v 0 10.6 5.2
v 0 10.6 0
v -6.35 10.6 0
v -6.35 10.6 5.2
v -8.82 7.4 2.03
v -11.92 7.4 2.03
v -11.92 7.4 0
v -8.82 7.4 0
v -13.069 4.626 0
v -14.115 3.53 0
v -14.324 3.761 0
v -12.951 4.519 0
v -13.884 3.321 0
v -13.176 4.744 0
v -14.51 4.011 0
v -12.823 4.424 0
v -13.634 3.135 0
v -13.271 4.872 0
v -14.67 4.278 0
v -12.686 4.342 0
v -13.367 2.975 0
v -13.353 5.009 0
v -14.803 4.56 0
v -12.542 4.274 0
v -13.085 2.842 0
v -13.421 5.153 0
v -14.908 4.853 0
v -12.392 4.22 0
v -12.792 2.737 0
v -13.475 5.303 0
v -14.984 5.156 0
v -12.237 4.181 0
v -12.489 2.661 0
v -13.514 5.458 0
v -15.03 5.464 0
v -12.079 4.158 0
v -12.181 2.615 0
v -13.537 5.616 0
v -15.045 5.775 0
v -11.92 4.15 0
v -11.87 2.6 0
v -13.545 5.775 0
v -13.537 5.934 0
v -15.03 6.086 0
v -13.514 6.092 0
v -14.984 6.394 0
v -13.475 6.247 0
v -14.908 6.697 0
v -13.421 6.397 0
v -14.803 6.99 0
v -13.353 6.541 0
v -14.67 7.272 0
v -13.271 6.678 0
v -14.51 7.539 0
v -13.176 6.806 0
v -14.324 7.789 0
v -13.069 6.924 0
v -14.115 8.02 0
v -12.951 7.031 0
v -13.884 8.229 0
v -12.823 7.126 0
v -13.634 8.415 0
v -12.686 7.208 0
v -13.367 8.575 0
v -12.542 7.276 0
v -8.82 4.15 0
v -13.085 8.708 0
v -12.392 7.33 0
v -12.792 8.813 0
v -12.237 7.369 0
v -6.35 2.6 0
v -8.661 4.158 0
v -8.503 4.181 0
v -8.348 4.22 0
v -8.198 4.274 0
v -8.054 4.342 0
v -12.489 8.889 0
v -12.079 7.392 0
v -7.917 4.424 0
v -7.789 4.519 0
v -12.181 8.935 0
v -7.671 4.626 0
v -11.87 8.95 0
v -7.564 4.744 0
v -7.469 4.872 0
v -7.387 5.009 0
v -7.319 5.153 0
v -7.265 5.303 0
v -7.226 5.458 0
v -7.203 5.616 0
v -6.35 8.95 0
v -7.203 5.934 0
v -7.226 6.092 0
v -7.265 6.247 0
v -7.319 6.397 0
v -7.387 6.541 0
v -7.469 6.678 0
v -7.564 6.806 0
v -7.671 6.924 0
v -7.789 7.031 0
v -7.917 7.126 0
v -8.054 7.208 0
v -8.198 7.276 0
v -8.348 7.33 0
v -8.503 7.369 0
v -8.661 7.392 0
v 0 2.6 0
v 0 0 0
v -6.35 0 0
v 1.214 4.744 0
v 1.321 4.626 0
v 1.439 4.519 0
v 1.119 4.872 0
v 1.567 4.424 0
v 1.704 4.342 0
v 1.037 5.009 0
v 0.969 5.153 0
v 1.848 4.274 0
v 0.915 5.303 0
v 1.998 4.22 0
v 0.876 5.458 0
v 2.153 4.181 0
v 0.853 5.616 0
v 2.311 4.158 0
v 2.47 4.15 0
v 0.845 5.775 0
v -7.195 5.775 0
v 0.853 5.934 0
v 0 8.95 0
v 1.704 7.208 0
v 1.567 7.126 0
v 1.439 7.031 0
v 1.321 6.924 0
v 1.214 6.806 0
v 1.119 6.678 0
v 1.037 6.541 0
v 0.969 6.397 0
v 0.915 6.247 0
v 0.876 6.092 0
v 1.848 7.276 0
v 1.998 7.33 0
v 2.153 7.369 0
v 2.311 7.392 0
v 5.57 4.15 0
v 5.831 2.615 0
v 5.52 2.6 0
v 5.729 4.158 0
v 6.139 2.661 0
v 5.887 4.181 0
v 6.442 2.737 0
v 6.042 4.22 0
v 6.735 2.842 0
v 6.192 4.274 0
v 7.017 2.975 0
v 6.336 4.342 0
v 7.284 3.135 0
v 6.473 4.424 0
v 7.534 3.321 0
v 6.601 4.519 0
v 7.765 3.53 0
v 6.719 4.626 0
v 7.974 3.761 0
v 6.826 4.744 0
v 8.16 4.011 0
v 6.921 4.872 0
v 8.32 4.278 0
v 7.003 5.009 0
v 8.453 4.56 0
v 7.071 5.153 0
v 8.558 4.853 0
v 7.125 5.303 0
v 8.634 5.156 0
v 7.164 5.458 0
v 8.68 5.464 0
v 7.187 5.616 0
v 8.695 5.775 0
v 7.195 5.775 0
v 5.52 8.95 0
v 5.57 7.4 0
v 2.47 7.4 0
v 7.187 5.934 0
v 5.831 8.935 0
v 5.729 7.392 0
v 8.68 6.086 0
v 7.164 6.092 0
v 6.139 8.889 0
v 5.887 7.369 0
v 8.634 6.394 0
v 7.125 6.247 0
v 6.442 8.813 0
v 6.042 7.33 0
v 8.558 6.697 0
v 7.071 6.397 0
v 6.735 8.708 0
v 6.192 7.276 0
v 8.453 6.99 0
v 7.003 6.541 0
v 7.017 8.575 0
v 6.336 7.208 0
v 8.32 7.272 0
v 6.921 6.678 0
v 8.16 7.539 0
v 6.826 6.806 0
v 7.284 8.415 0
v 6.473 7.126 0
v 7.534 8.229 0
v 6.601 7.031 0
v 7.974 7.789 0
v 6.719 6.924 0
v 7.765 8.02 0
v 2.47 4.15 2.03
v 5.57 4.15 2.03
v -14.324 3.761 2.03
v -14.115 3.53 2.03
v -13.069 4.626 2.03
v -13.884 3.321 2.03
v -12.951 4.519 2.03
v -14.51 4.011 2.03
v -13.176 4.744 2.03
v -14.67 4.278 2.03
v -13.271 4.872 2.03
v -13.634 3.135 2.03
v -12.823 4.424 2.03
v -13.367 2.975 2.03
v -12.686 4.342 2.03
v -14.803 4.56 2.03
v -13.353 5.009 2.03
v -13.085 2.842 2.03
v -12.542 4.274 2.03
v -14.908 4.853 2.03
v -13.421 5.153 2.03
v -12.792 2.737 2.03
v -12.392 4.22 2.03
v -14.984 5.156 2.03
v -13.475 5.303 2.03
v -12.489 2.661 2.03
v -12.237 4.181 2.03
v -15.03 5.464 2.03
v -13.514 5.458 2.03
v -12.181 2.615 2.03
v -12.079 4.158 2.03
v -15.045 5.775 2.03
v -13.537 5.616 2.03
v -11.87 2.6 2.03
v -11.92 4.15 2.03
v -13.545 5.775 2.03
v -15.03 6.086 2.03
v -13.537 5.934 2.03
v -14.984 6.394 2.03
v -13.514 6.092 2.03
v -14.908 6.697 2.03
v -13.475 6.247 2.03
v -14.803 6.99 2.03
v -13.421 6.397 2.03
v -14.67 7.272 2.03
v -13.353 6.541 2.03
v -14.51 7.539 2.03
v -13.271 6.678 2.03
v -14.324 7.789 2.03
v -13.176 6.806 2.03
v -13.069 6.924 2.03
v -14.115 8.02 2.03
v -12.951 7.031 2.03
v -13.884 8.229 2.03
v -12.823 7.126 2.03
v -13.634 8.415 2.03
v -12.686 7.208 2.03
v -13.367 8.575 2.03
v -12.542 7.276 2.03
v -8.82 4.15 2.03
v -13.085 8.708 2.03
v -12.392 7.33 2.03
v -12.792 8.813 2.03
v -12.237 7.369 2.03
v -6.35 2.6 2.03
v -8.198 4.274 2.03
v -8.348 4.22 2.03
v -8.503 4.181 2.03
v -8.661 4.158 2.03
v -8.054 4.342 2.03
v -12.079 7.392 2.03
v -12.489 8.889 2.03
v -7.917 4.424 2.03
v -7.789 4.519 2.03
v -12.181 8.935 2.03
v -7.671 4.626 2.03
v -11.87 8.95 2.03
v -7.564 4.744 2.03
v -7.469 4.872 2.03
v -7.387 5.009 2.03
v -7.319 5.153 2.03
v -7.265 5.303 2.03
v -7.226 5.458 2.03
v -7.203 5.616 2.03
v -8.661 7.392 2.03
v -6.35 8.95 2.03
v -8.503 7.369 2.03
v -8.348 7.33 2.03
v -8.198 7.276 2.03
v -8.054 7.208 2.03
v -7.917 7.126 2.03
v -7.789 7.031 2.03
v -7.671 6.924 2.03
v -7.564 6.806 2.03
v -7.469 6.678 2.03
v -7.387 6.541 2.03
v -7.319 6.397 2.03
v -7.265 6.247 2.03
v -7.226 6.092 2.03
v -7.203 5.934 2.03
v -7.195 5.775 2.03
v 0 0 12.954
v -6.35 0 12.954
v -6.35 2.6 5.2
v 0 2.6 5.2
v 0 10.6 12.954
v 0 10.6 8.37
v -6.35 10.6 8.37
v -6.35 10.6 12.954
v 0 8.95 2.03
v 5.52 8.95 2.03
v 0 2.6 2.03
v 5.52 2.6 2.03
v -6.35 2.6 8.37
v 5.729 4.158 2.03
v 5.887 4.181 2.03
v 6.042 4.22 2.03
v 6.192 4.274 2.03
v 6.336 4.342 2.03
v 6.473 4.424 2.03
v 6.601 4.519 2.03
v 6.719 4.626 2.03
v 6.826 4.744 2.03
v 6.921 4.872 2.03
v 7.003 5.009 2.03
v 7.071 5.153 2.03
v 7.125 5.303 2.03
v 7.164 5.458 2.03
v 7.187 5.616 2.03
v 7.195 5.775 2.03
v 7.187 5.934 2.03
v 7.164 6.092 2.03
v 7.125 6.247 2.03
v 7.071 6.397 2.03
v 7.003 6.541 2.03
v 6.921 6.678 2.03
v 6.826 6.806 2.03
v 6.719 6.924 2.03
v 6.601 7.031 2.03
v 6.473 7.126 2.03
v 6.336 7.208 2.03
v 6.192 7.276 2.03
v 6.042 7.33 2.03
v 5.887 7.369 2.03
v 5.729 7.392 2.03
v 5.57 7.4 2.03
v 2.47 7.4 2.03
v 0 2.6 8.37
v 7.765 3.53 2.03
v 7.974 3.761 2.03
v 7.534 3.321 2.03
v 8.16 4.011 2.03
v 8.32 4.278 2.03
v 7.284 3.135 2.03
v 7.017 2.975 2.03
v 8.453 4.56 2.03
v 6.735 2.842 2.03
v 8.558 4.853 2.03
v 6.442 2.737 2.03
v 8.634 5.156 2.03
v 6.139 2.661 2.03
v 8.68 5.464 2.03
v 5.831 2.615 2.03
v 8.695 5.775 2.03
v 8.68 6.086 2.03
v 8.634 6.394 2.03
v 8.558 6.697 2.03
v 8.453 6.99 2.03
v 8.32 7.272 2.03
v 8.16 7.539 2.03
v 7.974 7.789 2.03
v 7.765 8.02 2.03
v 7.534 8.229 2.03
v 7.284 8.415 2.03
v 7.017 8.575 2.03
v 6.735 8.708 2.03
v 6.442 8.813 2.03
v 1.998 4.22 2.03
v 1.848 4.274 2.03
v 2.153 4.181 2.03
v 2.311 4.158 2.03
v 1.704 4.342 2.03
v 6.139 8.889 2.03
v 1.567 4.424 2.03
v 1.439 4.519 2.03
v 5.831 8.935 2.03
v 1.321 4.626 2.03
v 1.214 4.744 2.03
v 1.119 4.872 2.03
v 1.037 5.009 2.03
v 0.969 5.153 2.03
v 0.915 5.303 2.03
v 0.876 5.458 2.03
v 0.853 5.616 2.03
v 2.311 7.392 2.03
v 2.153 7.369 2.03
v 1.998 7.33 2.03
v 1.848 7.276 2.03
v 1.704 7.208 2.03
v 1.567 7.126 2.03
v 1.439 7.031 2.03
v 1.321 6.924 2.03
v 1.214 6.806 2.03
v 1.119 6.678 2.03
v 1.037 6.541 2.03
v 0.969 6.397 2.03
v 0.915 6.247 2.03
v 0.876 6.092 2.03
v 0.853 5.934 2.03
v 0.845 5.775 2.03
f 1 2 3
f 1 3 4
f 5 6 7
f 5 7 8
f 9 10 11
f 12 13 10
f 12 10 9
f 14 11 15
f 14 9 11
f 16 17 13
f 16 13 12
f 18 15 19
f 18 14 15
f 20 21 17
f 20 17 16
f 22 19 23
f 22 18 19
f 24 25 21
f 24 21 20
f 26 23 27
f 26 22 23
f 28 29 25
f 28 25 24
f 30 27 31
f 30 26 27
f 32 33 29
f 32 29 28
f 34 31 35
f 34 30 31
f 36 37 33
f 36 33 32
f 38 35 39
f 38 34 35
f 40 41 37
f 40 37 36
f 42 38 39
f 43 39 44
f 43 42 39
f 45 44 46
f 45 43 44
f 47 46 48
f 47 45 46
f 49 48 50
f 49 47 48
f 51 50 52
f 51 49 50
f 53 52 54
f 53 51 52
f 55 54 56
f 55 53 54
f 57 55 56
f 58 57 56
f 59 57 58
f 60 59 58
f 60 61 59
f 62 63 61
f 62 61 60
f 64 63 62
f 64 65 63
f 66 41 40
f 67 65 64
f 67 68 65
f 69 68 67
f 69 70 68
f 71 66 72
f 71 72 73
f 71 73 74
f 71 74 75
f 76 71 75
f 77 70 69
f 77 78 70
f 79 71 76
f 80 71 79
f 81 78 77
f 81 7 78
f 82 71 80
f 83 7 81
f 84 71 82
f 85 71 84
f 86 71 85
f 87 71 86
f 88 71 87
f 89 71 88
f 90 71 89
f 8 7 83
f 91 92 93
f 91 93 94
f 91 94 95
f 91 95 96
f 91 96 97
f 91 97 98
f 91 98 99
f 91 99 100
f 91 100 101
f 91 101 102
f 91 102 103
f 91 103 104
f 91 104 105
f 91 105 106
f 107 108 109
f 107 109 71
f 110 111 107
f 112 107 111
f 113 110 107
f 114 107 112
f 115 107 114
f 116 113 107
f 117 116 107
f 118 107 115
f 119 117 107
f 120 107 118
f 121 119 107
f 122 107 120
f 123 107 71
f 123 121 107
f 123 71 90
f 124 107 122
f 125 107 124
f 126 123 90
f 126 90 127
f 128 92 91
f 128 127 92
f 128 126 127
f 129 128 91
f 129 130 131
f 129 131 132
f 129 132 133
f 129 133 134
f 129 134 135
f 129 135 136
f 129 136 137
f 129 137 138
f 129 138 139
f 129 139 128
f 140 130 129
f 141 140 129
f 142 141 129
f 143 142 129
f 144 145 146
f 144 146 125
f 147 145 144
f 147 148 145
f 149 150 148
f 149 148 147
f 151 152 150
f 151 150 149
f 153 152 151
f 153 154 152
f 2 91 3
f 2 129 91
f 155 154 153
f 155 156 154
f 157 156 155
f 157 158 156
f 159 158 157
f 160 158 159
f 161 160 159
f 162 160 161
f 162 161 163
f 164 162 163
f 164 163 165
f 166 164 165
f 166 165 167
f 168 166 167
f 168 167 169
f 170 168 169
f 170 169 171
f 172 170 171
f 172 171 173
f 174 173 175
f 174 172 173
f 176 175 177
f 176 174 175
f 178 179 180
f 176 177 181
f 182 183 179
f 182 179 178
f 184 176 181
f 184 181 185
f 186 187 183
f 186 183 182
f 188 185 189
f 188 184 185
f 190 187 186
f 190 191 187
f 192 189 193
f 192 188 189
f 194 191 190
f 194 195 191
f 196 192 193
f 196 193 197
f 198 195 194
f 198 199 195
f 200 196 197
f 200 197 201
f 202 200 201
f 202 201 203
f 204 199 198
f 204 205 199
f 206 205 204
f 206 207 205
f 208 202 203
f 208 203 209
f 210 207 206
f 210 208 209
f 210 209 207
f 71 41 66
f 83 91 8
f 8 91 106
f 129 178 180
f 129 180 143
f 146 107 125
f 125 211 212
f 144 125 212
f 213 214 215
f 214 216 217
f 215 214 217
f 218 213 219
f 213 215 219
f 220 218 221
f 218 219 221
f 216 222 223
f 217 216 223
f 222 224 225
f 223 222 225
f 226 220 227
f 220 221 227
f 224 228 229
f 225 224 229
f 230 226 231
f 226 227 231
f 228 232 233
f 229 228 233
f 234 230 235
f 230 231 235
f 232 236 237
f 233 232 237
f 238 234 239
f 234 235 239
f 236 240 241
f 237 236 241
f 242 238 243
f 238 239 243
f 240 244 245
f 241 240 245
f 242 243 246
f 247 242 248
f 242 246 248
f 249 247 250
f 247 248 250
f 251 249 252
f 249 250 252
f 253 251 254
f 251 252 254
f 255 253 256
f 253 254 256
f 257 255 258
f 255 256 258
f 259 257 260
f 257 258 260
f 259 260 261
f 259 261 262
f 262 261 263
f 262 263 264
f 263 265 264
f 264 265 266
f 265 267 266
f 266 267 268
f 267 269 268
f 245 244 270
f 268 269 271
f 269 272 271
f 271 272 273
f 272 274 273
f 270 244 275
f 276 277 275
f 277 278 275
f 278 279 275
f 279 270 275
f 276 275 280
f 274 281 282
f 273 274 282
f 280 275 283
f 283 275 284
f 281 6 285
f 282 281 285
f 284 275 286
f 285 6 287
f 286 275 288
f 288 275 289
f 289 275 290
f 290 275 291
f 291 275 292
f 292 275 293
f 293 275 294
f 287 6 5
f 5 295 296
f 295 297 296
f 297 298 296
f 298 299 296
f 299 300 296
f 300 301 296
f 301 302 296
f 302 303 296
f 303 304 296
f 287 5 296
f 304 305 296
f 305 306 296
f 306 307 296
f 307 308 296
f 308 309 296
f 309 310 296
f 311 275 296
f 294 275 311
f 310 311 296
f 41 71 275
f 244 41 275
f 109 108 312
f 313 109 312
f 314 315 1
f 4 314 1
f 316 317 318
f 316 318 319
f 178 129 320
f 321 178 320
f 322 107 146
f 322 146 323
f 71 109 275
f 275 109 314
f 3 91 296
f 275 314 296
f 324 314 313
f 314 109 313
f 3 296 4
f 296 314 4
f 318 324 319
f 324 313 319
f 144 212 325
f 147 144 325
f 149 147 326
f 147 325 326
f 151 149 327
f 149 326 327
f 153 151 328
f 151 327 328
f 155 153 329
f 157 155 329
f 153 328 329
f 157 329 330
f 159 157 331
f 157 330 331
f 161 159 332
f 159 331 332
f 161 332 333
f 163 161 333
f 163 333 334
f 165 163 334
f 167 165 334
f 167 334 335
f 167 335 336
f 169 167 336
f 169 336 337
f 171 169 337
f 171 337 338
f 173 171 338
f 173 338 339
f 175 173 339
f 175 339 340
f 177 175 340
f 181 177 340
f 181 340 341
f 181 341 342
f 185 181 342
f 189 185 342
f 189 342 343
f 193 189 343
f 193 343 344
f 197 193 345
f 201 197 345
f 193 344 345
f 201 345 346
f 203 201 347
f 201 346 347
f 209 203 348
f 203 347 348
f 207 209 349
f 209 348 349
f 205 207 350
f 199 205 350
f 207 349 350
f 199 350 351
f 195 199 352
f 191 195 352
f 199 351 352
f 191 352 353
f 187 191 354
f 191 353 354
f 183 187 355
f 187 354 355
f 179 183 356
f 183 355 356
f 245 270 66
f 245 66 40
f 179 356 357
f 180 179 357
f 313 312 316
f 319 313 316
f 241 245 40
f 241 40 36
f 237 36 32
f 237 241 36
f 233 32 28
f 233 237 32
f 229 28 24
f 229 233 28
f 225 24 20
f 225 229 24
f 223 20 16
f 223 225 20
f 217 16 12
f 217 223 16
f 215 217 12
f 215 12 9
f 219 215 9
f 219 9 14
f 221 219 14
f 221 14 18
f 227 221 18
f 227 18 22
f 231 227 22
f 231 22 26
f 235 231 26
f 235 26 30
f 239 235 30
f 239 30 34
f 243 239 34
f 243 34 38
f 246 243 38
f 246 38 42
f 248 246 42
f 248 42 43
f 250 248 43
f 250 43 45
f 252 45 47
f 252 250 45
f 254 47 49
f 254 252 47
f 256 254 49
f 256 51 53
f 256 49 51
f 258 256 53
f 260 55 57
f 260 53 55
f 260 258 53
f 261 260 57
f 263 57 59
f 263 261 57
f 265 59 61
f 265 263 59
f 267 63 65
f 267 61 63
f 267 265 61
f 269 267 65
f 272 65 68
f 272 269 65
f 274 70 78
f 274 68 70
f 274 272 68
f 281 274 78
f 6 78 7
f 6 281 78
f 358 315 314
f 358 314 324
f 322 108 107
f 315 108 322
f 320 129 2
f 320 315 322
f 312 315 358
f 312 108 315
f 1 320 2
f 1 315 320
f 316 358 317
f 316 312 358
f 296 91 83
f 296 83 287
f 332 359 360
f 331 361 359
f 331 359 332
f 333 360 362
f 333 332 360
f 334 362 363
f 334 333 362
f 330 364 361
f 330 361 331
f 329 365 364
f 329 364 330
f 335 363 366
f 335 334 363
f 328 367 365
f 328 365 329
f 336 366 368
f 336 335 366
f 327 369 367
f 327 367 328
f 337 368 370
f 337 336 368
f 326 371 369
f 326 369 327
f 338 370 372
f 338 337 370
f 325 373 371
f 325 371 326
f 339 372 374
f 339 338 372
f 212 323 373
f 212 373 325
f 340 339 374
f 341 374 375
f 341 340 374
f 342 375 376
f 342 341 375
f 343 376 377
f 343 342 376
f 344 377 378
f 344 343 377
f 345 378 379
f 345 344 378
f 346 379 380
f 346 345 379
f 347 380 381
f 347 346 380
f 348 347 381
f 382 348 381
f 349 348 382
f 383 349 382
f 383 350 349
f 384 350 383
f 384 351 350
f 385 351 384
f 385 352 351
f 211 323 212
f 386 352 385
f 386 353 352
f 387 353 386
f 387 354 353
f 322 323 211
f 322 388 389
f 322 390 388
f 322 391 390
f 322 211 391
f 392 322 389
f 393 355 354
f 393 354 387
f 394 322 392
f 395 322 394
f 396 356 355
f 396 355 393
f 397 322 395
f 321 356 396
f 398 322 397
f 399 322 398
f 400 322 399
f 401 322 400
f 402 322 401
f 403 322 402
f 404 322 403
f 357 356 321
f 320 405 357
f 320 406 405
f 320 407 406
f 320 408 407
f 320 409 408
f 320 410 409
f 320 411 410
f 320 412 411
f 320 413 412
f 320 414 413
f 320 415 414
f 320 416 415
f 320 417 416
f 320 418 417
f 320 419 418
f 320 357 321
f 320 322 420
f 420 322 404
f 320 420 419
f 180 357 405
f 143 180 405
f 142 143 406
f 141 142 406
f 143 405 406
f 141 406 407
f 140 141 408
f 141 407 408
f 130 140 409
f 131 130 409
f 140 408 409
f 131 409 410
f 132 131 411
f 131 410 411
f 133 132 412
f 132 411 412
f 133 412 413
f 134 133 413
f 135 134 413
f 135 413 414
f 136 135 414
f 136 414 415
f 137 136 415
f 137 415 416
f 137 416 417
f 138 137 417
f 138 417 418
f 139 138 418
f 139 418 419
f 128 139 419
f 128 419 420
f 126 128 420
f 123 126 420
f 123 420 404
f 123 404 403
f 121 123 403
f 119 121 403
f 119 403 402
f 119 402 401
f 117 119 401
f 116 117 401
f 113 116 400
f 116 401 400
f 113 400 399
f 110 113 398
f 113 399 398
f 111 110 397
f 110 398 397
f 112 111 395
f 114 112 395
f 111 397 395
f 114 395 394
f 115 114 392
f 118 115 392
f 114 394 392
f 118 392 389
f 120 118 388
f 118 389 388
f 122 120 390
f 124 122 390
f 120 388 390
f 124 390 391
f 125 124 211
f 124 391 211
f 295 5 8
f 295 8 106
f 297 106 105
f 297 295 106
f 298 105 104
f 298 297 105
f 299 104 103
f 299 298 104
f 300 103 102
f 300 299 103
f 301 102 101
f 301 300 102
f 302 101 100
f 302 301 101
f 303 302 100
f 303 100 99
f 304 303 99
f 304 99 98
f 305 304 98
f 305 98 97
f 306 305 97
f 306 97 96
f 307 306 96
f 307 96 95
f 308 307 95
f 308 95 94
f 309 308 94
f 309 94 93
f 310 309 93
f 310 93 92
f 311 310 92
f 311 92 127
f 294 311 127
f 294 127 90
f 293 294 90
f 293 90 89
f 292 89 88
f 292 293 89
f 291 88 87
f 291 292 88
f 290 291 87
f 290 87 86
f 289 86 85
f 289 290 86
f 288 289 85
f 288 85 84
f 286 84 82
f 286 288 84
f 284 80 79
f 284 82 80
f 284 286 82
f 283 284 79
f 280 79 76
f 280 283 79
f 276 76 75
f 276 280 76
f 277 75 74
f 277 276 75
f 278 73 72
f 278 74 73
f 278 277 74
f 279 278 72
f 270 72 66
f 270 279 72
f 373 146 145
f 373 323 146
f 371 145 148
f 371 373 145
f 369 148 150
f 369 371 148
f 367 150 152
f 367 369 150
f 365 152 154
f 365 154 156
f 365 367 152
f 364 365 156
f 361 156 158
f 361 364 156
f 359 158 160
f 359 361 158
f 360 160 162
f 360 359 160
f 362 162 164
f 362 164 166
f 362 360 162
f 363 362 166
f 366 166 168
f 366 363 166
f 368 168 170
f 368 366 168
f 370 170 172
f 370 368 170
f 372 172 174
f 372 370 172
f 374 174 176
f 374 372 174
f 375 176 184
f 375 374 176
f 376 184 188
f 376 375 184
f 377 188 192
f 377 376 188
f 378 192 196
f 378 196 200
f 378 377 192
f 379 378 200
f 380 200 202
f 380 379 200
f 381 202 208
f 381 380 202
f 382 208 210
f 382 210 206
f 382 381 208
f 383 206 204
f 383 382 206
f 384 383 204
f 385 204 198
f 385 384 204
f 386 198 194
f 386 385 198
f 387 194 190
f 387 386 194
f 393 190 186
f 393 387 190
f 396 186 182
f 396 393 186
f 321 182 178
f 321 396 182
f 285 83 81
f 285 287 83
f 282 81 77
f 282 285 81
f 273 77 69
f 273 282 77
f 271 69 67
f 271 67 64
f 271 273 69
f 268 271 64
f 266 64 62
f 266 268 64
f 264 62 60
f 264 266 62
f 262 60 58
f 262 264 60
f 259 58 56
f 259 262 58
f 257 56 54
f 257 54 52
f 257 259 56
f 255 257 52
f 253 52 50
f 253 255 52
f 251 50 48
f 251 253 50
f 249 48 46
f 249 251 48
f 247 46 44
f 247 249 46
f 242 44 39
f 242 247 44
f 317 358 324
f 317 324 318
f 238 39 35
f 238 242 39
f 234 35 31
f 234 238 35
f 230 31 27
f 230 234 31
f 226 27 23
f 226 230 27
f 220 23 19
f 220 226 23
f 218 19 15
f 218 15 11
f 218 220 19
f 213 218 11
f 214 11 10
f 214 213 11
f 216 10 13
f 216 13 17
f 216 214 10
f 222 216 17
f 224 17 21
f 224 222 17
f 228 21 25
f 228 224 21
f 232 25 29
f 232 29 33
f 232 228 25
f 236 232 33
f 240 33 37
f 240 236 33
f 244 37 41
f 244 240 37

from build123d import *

# Parameters (mm, degrees)
F0_W     = 10.6
F0_H     = 12.954
F1_DEPTH = 6.35
F2_W     = 8
F2_H     = 3.17
F3_DEPTH = 6.351
F4_W     = 6.35
F4_H     = 2.03
F5_DEPTH = 8.695
F6_R     = 3.17499
F9_DEPTH = 2.031


# Not quite as in the source:
# - a fillet or chamfer is up to 0.001 mm smaller than in the source, because OpenCascade refuses the exact size
# - a pattern or mirror of a feature is missing from the dataset's text; its kind, count and spacing are read off the source's solid


with BuildPart() as f1:
    # F0 (on Right) → F1 (new body)
    with BuildSketch(Plane.YZ):
        with Locations((5.3, 6.477)):
            Rectangle(F0_W, F0_H)
    extrude(amount=-F1_DEPTH)

    # F2 (on face) → F3 (cut, through all)
    with BuildSketch(Plane.YZ):
        with Locations((6.6, 6.785)):
            Rectangle(F2_W, F2_H)
    extrude(amount=-F3_DEPTH, mode=Mode.SUBTRACT)

    # F4 (on face) → F5 (join)
    with BuildSketch(Plane.YZ):
        with Locations((5.775, 1.015)):
            Rectangle(F4_W, F4_H)
    f5 = extrude(amount=F5_DEPTH)

    # F5_copies: F5 across plane
    add(f5.mirror(Plane(origin=(-3.174997, 0, 0), x_dir=(0, 0, -1), z_dir=(-1, 0, 0))))

    # F6 (radius 3.175 in the source; OpenCascade refuses exactly that, so slightly less here)
    f6_edges = [f1.edges().sort_by_distance(p)[0] for p in [
        (8.695, 2.6, 1.015),
        (8.695, 8.95, 1.015),
        (-15.044994, 8.95, 1.015),
        (-15.044994, 2.6, 1.015),
    ]]
    fillet(f6_edges, radius=F6_R)

    # F8 (on face) → F9 (cut, through all)
    with BuildSketch(Plane.XY.offset(2.03)):
        with BuildLine():
            Line((2.47, 4.15), (5.57, 4.15))
            ThreePointArc((5.57, 4.15), (7.195, 5.775), (5.57, 7.4))
            Line((5.57, 7.4), (2.47, 7.4))
            ThreePointArc((2.47, 7.4), (0.845, 5.775), (2.47, 4.15))
        make_face()
    f9 = extrude(amount=-F9_DEPTH, mode=Mode.SUBTRACT)

    # F9_copies: F9 across plane
    add(f9.mirror(Plane(origin=(-3.175, 0, 0), x_dir=(0, 0, -1), z_dir=(-1, 0, 0))), mode=Mode.SUBTRACT)


solid = f1.part
